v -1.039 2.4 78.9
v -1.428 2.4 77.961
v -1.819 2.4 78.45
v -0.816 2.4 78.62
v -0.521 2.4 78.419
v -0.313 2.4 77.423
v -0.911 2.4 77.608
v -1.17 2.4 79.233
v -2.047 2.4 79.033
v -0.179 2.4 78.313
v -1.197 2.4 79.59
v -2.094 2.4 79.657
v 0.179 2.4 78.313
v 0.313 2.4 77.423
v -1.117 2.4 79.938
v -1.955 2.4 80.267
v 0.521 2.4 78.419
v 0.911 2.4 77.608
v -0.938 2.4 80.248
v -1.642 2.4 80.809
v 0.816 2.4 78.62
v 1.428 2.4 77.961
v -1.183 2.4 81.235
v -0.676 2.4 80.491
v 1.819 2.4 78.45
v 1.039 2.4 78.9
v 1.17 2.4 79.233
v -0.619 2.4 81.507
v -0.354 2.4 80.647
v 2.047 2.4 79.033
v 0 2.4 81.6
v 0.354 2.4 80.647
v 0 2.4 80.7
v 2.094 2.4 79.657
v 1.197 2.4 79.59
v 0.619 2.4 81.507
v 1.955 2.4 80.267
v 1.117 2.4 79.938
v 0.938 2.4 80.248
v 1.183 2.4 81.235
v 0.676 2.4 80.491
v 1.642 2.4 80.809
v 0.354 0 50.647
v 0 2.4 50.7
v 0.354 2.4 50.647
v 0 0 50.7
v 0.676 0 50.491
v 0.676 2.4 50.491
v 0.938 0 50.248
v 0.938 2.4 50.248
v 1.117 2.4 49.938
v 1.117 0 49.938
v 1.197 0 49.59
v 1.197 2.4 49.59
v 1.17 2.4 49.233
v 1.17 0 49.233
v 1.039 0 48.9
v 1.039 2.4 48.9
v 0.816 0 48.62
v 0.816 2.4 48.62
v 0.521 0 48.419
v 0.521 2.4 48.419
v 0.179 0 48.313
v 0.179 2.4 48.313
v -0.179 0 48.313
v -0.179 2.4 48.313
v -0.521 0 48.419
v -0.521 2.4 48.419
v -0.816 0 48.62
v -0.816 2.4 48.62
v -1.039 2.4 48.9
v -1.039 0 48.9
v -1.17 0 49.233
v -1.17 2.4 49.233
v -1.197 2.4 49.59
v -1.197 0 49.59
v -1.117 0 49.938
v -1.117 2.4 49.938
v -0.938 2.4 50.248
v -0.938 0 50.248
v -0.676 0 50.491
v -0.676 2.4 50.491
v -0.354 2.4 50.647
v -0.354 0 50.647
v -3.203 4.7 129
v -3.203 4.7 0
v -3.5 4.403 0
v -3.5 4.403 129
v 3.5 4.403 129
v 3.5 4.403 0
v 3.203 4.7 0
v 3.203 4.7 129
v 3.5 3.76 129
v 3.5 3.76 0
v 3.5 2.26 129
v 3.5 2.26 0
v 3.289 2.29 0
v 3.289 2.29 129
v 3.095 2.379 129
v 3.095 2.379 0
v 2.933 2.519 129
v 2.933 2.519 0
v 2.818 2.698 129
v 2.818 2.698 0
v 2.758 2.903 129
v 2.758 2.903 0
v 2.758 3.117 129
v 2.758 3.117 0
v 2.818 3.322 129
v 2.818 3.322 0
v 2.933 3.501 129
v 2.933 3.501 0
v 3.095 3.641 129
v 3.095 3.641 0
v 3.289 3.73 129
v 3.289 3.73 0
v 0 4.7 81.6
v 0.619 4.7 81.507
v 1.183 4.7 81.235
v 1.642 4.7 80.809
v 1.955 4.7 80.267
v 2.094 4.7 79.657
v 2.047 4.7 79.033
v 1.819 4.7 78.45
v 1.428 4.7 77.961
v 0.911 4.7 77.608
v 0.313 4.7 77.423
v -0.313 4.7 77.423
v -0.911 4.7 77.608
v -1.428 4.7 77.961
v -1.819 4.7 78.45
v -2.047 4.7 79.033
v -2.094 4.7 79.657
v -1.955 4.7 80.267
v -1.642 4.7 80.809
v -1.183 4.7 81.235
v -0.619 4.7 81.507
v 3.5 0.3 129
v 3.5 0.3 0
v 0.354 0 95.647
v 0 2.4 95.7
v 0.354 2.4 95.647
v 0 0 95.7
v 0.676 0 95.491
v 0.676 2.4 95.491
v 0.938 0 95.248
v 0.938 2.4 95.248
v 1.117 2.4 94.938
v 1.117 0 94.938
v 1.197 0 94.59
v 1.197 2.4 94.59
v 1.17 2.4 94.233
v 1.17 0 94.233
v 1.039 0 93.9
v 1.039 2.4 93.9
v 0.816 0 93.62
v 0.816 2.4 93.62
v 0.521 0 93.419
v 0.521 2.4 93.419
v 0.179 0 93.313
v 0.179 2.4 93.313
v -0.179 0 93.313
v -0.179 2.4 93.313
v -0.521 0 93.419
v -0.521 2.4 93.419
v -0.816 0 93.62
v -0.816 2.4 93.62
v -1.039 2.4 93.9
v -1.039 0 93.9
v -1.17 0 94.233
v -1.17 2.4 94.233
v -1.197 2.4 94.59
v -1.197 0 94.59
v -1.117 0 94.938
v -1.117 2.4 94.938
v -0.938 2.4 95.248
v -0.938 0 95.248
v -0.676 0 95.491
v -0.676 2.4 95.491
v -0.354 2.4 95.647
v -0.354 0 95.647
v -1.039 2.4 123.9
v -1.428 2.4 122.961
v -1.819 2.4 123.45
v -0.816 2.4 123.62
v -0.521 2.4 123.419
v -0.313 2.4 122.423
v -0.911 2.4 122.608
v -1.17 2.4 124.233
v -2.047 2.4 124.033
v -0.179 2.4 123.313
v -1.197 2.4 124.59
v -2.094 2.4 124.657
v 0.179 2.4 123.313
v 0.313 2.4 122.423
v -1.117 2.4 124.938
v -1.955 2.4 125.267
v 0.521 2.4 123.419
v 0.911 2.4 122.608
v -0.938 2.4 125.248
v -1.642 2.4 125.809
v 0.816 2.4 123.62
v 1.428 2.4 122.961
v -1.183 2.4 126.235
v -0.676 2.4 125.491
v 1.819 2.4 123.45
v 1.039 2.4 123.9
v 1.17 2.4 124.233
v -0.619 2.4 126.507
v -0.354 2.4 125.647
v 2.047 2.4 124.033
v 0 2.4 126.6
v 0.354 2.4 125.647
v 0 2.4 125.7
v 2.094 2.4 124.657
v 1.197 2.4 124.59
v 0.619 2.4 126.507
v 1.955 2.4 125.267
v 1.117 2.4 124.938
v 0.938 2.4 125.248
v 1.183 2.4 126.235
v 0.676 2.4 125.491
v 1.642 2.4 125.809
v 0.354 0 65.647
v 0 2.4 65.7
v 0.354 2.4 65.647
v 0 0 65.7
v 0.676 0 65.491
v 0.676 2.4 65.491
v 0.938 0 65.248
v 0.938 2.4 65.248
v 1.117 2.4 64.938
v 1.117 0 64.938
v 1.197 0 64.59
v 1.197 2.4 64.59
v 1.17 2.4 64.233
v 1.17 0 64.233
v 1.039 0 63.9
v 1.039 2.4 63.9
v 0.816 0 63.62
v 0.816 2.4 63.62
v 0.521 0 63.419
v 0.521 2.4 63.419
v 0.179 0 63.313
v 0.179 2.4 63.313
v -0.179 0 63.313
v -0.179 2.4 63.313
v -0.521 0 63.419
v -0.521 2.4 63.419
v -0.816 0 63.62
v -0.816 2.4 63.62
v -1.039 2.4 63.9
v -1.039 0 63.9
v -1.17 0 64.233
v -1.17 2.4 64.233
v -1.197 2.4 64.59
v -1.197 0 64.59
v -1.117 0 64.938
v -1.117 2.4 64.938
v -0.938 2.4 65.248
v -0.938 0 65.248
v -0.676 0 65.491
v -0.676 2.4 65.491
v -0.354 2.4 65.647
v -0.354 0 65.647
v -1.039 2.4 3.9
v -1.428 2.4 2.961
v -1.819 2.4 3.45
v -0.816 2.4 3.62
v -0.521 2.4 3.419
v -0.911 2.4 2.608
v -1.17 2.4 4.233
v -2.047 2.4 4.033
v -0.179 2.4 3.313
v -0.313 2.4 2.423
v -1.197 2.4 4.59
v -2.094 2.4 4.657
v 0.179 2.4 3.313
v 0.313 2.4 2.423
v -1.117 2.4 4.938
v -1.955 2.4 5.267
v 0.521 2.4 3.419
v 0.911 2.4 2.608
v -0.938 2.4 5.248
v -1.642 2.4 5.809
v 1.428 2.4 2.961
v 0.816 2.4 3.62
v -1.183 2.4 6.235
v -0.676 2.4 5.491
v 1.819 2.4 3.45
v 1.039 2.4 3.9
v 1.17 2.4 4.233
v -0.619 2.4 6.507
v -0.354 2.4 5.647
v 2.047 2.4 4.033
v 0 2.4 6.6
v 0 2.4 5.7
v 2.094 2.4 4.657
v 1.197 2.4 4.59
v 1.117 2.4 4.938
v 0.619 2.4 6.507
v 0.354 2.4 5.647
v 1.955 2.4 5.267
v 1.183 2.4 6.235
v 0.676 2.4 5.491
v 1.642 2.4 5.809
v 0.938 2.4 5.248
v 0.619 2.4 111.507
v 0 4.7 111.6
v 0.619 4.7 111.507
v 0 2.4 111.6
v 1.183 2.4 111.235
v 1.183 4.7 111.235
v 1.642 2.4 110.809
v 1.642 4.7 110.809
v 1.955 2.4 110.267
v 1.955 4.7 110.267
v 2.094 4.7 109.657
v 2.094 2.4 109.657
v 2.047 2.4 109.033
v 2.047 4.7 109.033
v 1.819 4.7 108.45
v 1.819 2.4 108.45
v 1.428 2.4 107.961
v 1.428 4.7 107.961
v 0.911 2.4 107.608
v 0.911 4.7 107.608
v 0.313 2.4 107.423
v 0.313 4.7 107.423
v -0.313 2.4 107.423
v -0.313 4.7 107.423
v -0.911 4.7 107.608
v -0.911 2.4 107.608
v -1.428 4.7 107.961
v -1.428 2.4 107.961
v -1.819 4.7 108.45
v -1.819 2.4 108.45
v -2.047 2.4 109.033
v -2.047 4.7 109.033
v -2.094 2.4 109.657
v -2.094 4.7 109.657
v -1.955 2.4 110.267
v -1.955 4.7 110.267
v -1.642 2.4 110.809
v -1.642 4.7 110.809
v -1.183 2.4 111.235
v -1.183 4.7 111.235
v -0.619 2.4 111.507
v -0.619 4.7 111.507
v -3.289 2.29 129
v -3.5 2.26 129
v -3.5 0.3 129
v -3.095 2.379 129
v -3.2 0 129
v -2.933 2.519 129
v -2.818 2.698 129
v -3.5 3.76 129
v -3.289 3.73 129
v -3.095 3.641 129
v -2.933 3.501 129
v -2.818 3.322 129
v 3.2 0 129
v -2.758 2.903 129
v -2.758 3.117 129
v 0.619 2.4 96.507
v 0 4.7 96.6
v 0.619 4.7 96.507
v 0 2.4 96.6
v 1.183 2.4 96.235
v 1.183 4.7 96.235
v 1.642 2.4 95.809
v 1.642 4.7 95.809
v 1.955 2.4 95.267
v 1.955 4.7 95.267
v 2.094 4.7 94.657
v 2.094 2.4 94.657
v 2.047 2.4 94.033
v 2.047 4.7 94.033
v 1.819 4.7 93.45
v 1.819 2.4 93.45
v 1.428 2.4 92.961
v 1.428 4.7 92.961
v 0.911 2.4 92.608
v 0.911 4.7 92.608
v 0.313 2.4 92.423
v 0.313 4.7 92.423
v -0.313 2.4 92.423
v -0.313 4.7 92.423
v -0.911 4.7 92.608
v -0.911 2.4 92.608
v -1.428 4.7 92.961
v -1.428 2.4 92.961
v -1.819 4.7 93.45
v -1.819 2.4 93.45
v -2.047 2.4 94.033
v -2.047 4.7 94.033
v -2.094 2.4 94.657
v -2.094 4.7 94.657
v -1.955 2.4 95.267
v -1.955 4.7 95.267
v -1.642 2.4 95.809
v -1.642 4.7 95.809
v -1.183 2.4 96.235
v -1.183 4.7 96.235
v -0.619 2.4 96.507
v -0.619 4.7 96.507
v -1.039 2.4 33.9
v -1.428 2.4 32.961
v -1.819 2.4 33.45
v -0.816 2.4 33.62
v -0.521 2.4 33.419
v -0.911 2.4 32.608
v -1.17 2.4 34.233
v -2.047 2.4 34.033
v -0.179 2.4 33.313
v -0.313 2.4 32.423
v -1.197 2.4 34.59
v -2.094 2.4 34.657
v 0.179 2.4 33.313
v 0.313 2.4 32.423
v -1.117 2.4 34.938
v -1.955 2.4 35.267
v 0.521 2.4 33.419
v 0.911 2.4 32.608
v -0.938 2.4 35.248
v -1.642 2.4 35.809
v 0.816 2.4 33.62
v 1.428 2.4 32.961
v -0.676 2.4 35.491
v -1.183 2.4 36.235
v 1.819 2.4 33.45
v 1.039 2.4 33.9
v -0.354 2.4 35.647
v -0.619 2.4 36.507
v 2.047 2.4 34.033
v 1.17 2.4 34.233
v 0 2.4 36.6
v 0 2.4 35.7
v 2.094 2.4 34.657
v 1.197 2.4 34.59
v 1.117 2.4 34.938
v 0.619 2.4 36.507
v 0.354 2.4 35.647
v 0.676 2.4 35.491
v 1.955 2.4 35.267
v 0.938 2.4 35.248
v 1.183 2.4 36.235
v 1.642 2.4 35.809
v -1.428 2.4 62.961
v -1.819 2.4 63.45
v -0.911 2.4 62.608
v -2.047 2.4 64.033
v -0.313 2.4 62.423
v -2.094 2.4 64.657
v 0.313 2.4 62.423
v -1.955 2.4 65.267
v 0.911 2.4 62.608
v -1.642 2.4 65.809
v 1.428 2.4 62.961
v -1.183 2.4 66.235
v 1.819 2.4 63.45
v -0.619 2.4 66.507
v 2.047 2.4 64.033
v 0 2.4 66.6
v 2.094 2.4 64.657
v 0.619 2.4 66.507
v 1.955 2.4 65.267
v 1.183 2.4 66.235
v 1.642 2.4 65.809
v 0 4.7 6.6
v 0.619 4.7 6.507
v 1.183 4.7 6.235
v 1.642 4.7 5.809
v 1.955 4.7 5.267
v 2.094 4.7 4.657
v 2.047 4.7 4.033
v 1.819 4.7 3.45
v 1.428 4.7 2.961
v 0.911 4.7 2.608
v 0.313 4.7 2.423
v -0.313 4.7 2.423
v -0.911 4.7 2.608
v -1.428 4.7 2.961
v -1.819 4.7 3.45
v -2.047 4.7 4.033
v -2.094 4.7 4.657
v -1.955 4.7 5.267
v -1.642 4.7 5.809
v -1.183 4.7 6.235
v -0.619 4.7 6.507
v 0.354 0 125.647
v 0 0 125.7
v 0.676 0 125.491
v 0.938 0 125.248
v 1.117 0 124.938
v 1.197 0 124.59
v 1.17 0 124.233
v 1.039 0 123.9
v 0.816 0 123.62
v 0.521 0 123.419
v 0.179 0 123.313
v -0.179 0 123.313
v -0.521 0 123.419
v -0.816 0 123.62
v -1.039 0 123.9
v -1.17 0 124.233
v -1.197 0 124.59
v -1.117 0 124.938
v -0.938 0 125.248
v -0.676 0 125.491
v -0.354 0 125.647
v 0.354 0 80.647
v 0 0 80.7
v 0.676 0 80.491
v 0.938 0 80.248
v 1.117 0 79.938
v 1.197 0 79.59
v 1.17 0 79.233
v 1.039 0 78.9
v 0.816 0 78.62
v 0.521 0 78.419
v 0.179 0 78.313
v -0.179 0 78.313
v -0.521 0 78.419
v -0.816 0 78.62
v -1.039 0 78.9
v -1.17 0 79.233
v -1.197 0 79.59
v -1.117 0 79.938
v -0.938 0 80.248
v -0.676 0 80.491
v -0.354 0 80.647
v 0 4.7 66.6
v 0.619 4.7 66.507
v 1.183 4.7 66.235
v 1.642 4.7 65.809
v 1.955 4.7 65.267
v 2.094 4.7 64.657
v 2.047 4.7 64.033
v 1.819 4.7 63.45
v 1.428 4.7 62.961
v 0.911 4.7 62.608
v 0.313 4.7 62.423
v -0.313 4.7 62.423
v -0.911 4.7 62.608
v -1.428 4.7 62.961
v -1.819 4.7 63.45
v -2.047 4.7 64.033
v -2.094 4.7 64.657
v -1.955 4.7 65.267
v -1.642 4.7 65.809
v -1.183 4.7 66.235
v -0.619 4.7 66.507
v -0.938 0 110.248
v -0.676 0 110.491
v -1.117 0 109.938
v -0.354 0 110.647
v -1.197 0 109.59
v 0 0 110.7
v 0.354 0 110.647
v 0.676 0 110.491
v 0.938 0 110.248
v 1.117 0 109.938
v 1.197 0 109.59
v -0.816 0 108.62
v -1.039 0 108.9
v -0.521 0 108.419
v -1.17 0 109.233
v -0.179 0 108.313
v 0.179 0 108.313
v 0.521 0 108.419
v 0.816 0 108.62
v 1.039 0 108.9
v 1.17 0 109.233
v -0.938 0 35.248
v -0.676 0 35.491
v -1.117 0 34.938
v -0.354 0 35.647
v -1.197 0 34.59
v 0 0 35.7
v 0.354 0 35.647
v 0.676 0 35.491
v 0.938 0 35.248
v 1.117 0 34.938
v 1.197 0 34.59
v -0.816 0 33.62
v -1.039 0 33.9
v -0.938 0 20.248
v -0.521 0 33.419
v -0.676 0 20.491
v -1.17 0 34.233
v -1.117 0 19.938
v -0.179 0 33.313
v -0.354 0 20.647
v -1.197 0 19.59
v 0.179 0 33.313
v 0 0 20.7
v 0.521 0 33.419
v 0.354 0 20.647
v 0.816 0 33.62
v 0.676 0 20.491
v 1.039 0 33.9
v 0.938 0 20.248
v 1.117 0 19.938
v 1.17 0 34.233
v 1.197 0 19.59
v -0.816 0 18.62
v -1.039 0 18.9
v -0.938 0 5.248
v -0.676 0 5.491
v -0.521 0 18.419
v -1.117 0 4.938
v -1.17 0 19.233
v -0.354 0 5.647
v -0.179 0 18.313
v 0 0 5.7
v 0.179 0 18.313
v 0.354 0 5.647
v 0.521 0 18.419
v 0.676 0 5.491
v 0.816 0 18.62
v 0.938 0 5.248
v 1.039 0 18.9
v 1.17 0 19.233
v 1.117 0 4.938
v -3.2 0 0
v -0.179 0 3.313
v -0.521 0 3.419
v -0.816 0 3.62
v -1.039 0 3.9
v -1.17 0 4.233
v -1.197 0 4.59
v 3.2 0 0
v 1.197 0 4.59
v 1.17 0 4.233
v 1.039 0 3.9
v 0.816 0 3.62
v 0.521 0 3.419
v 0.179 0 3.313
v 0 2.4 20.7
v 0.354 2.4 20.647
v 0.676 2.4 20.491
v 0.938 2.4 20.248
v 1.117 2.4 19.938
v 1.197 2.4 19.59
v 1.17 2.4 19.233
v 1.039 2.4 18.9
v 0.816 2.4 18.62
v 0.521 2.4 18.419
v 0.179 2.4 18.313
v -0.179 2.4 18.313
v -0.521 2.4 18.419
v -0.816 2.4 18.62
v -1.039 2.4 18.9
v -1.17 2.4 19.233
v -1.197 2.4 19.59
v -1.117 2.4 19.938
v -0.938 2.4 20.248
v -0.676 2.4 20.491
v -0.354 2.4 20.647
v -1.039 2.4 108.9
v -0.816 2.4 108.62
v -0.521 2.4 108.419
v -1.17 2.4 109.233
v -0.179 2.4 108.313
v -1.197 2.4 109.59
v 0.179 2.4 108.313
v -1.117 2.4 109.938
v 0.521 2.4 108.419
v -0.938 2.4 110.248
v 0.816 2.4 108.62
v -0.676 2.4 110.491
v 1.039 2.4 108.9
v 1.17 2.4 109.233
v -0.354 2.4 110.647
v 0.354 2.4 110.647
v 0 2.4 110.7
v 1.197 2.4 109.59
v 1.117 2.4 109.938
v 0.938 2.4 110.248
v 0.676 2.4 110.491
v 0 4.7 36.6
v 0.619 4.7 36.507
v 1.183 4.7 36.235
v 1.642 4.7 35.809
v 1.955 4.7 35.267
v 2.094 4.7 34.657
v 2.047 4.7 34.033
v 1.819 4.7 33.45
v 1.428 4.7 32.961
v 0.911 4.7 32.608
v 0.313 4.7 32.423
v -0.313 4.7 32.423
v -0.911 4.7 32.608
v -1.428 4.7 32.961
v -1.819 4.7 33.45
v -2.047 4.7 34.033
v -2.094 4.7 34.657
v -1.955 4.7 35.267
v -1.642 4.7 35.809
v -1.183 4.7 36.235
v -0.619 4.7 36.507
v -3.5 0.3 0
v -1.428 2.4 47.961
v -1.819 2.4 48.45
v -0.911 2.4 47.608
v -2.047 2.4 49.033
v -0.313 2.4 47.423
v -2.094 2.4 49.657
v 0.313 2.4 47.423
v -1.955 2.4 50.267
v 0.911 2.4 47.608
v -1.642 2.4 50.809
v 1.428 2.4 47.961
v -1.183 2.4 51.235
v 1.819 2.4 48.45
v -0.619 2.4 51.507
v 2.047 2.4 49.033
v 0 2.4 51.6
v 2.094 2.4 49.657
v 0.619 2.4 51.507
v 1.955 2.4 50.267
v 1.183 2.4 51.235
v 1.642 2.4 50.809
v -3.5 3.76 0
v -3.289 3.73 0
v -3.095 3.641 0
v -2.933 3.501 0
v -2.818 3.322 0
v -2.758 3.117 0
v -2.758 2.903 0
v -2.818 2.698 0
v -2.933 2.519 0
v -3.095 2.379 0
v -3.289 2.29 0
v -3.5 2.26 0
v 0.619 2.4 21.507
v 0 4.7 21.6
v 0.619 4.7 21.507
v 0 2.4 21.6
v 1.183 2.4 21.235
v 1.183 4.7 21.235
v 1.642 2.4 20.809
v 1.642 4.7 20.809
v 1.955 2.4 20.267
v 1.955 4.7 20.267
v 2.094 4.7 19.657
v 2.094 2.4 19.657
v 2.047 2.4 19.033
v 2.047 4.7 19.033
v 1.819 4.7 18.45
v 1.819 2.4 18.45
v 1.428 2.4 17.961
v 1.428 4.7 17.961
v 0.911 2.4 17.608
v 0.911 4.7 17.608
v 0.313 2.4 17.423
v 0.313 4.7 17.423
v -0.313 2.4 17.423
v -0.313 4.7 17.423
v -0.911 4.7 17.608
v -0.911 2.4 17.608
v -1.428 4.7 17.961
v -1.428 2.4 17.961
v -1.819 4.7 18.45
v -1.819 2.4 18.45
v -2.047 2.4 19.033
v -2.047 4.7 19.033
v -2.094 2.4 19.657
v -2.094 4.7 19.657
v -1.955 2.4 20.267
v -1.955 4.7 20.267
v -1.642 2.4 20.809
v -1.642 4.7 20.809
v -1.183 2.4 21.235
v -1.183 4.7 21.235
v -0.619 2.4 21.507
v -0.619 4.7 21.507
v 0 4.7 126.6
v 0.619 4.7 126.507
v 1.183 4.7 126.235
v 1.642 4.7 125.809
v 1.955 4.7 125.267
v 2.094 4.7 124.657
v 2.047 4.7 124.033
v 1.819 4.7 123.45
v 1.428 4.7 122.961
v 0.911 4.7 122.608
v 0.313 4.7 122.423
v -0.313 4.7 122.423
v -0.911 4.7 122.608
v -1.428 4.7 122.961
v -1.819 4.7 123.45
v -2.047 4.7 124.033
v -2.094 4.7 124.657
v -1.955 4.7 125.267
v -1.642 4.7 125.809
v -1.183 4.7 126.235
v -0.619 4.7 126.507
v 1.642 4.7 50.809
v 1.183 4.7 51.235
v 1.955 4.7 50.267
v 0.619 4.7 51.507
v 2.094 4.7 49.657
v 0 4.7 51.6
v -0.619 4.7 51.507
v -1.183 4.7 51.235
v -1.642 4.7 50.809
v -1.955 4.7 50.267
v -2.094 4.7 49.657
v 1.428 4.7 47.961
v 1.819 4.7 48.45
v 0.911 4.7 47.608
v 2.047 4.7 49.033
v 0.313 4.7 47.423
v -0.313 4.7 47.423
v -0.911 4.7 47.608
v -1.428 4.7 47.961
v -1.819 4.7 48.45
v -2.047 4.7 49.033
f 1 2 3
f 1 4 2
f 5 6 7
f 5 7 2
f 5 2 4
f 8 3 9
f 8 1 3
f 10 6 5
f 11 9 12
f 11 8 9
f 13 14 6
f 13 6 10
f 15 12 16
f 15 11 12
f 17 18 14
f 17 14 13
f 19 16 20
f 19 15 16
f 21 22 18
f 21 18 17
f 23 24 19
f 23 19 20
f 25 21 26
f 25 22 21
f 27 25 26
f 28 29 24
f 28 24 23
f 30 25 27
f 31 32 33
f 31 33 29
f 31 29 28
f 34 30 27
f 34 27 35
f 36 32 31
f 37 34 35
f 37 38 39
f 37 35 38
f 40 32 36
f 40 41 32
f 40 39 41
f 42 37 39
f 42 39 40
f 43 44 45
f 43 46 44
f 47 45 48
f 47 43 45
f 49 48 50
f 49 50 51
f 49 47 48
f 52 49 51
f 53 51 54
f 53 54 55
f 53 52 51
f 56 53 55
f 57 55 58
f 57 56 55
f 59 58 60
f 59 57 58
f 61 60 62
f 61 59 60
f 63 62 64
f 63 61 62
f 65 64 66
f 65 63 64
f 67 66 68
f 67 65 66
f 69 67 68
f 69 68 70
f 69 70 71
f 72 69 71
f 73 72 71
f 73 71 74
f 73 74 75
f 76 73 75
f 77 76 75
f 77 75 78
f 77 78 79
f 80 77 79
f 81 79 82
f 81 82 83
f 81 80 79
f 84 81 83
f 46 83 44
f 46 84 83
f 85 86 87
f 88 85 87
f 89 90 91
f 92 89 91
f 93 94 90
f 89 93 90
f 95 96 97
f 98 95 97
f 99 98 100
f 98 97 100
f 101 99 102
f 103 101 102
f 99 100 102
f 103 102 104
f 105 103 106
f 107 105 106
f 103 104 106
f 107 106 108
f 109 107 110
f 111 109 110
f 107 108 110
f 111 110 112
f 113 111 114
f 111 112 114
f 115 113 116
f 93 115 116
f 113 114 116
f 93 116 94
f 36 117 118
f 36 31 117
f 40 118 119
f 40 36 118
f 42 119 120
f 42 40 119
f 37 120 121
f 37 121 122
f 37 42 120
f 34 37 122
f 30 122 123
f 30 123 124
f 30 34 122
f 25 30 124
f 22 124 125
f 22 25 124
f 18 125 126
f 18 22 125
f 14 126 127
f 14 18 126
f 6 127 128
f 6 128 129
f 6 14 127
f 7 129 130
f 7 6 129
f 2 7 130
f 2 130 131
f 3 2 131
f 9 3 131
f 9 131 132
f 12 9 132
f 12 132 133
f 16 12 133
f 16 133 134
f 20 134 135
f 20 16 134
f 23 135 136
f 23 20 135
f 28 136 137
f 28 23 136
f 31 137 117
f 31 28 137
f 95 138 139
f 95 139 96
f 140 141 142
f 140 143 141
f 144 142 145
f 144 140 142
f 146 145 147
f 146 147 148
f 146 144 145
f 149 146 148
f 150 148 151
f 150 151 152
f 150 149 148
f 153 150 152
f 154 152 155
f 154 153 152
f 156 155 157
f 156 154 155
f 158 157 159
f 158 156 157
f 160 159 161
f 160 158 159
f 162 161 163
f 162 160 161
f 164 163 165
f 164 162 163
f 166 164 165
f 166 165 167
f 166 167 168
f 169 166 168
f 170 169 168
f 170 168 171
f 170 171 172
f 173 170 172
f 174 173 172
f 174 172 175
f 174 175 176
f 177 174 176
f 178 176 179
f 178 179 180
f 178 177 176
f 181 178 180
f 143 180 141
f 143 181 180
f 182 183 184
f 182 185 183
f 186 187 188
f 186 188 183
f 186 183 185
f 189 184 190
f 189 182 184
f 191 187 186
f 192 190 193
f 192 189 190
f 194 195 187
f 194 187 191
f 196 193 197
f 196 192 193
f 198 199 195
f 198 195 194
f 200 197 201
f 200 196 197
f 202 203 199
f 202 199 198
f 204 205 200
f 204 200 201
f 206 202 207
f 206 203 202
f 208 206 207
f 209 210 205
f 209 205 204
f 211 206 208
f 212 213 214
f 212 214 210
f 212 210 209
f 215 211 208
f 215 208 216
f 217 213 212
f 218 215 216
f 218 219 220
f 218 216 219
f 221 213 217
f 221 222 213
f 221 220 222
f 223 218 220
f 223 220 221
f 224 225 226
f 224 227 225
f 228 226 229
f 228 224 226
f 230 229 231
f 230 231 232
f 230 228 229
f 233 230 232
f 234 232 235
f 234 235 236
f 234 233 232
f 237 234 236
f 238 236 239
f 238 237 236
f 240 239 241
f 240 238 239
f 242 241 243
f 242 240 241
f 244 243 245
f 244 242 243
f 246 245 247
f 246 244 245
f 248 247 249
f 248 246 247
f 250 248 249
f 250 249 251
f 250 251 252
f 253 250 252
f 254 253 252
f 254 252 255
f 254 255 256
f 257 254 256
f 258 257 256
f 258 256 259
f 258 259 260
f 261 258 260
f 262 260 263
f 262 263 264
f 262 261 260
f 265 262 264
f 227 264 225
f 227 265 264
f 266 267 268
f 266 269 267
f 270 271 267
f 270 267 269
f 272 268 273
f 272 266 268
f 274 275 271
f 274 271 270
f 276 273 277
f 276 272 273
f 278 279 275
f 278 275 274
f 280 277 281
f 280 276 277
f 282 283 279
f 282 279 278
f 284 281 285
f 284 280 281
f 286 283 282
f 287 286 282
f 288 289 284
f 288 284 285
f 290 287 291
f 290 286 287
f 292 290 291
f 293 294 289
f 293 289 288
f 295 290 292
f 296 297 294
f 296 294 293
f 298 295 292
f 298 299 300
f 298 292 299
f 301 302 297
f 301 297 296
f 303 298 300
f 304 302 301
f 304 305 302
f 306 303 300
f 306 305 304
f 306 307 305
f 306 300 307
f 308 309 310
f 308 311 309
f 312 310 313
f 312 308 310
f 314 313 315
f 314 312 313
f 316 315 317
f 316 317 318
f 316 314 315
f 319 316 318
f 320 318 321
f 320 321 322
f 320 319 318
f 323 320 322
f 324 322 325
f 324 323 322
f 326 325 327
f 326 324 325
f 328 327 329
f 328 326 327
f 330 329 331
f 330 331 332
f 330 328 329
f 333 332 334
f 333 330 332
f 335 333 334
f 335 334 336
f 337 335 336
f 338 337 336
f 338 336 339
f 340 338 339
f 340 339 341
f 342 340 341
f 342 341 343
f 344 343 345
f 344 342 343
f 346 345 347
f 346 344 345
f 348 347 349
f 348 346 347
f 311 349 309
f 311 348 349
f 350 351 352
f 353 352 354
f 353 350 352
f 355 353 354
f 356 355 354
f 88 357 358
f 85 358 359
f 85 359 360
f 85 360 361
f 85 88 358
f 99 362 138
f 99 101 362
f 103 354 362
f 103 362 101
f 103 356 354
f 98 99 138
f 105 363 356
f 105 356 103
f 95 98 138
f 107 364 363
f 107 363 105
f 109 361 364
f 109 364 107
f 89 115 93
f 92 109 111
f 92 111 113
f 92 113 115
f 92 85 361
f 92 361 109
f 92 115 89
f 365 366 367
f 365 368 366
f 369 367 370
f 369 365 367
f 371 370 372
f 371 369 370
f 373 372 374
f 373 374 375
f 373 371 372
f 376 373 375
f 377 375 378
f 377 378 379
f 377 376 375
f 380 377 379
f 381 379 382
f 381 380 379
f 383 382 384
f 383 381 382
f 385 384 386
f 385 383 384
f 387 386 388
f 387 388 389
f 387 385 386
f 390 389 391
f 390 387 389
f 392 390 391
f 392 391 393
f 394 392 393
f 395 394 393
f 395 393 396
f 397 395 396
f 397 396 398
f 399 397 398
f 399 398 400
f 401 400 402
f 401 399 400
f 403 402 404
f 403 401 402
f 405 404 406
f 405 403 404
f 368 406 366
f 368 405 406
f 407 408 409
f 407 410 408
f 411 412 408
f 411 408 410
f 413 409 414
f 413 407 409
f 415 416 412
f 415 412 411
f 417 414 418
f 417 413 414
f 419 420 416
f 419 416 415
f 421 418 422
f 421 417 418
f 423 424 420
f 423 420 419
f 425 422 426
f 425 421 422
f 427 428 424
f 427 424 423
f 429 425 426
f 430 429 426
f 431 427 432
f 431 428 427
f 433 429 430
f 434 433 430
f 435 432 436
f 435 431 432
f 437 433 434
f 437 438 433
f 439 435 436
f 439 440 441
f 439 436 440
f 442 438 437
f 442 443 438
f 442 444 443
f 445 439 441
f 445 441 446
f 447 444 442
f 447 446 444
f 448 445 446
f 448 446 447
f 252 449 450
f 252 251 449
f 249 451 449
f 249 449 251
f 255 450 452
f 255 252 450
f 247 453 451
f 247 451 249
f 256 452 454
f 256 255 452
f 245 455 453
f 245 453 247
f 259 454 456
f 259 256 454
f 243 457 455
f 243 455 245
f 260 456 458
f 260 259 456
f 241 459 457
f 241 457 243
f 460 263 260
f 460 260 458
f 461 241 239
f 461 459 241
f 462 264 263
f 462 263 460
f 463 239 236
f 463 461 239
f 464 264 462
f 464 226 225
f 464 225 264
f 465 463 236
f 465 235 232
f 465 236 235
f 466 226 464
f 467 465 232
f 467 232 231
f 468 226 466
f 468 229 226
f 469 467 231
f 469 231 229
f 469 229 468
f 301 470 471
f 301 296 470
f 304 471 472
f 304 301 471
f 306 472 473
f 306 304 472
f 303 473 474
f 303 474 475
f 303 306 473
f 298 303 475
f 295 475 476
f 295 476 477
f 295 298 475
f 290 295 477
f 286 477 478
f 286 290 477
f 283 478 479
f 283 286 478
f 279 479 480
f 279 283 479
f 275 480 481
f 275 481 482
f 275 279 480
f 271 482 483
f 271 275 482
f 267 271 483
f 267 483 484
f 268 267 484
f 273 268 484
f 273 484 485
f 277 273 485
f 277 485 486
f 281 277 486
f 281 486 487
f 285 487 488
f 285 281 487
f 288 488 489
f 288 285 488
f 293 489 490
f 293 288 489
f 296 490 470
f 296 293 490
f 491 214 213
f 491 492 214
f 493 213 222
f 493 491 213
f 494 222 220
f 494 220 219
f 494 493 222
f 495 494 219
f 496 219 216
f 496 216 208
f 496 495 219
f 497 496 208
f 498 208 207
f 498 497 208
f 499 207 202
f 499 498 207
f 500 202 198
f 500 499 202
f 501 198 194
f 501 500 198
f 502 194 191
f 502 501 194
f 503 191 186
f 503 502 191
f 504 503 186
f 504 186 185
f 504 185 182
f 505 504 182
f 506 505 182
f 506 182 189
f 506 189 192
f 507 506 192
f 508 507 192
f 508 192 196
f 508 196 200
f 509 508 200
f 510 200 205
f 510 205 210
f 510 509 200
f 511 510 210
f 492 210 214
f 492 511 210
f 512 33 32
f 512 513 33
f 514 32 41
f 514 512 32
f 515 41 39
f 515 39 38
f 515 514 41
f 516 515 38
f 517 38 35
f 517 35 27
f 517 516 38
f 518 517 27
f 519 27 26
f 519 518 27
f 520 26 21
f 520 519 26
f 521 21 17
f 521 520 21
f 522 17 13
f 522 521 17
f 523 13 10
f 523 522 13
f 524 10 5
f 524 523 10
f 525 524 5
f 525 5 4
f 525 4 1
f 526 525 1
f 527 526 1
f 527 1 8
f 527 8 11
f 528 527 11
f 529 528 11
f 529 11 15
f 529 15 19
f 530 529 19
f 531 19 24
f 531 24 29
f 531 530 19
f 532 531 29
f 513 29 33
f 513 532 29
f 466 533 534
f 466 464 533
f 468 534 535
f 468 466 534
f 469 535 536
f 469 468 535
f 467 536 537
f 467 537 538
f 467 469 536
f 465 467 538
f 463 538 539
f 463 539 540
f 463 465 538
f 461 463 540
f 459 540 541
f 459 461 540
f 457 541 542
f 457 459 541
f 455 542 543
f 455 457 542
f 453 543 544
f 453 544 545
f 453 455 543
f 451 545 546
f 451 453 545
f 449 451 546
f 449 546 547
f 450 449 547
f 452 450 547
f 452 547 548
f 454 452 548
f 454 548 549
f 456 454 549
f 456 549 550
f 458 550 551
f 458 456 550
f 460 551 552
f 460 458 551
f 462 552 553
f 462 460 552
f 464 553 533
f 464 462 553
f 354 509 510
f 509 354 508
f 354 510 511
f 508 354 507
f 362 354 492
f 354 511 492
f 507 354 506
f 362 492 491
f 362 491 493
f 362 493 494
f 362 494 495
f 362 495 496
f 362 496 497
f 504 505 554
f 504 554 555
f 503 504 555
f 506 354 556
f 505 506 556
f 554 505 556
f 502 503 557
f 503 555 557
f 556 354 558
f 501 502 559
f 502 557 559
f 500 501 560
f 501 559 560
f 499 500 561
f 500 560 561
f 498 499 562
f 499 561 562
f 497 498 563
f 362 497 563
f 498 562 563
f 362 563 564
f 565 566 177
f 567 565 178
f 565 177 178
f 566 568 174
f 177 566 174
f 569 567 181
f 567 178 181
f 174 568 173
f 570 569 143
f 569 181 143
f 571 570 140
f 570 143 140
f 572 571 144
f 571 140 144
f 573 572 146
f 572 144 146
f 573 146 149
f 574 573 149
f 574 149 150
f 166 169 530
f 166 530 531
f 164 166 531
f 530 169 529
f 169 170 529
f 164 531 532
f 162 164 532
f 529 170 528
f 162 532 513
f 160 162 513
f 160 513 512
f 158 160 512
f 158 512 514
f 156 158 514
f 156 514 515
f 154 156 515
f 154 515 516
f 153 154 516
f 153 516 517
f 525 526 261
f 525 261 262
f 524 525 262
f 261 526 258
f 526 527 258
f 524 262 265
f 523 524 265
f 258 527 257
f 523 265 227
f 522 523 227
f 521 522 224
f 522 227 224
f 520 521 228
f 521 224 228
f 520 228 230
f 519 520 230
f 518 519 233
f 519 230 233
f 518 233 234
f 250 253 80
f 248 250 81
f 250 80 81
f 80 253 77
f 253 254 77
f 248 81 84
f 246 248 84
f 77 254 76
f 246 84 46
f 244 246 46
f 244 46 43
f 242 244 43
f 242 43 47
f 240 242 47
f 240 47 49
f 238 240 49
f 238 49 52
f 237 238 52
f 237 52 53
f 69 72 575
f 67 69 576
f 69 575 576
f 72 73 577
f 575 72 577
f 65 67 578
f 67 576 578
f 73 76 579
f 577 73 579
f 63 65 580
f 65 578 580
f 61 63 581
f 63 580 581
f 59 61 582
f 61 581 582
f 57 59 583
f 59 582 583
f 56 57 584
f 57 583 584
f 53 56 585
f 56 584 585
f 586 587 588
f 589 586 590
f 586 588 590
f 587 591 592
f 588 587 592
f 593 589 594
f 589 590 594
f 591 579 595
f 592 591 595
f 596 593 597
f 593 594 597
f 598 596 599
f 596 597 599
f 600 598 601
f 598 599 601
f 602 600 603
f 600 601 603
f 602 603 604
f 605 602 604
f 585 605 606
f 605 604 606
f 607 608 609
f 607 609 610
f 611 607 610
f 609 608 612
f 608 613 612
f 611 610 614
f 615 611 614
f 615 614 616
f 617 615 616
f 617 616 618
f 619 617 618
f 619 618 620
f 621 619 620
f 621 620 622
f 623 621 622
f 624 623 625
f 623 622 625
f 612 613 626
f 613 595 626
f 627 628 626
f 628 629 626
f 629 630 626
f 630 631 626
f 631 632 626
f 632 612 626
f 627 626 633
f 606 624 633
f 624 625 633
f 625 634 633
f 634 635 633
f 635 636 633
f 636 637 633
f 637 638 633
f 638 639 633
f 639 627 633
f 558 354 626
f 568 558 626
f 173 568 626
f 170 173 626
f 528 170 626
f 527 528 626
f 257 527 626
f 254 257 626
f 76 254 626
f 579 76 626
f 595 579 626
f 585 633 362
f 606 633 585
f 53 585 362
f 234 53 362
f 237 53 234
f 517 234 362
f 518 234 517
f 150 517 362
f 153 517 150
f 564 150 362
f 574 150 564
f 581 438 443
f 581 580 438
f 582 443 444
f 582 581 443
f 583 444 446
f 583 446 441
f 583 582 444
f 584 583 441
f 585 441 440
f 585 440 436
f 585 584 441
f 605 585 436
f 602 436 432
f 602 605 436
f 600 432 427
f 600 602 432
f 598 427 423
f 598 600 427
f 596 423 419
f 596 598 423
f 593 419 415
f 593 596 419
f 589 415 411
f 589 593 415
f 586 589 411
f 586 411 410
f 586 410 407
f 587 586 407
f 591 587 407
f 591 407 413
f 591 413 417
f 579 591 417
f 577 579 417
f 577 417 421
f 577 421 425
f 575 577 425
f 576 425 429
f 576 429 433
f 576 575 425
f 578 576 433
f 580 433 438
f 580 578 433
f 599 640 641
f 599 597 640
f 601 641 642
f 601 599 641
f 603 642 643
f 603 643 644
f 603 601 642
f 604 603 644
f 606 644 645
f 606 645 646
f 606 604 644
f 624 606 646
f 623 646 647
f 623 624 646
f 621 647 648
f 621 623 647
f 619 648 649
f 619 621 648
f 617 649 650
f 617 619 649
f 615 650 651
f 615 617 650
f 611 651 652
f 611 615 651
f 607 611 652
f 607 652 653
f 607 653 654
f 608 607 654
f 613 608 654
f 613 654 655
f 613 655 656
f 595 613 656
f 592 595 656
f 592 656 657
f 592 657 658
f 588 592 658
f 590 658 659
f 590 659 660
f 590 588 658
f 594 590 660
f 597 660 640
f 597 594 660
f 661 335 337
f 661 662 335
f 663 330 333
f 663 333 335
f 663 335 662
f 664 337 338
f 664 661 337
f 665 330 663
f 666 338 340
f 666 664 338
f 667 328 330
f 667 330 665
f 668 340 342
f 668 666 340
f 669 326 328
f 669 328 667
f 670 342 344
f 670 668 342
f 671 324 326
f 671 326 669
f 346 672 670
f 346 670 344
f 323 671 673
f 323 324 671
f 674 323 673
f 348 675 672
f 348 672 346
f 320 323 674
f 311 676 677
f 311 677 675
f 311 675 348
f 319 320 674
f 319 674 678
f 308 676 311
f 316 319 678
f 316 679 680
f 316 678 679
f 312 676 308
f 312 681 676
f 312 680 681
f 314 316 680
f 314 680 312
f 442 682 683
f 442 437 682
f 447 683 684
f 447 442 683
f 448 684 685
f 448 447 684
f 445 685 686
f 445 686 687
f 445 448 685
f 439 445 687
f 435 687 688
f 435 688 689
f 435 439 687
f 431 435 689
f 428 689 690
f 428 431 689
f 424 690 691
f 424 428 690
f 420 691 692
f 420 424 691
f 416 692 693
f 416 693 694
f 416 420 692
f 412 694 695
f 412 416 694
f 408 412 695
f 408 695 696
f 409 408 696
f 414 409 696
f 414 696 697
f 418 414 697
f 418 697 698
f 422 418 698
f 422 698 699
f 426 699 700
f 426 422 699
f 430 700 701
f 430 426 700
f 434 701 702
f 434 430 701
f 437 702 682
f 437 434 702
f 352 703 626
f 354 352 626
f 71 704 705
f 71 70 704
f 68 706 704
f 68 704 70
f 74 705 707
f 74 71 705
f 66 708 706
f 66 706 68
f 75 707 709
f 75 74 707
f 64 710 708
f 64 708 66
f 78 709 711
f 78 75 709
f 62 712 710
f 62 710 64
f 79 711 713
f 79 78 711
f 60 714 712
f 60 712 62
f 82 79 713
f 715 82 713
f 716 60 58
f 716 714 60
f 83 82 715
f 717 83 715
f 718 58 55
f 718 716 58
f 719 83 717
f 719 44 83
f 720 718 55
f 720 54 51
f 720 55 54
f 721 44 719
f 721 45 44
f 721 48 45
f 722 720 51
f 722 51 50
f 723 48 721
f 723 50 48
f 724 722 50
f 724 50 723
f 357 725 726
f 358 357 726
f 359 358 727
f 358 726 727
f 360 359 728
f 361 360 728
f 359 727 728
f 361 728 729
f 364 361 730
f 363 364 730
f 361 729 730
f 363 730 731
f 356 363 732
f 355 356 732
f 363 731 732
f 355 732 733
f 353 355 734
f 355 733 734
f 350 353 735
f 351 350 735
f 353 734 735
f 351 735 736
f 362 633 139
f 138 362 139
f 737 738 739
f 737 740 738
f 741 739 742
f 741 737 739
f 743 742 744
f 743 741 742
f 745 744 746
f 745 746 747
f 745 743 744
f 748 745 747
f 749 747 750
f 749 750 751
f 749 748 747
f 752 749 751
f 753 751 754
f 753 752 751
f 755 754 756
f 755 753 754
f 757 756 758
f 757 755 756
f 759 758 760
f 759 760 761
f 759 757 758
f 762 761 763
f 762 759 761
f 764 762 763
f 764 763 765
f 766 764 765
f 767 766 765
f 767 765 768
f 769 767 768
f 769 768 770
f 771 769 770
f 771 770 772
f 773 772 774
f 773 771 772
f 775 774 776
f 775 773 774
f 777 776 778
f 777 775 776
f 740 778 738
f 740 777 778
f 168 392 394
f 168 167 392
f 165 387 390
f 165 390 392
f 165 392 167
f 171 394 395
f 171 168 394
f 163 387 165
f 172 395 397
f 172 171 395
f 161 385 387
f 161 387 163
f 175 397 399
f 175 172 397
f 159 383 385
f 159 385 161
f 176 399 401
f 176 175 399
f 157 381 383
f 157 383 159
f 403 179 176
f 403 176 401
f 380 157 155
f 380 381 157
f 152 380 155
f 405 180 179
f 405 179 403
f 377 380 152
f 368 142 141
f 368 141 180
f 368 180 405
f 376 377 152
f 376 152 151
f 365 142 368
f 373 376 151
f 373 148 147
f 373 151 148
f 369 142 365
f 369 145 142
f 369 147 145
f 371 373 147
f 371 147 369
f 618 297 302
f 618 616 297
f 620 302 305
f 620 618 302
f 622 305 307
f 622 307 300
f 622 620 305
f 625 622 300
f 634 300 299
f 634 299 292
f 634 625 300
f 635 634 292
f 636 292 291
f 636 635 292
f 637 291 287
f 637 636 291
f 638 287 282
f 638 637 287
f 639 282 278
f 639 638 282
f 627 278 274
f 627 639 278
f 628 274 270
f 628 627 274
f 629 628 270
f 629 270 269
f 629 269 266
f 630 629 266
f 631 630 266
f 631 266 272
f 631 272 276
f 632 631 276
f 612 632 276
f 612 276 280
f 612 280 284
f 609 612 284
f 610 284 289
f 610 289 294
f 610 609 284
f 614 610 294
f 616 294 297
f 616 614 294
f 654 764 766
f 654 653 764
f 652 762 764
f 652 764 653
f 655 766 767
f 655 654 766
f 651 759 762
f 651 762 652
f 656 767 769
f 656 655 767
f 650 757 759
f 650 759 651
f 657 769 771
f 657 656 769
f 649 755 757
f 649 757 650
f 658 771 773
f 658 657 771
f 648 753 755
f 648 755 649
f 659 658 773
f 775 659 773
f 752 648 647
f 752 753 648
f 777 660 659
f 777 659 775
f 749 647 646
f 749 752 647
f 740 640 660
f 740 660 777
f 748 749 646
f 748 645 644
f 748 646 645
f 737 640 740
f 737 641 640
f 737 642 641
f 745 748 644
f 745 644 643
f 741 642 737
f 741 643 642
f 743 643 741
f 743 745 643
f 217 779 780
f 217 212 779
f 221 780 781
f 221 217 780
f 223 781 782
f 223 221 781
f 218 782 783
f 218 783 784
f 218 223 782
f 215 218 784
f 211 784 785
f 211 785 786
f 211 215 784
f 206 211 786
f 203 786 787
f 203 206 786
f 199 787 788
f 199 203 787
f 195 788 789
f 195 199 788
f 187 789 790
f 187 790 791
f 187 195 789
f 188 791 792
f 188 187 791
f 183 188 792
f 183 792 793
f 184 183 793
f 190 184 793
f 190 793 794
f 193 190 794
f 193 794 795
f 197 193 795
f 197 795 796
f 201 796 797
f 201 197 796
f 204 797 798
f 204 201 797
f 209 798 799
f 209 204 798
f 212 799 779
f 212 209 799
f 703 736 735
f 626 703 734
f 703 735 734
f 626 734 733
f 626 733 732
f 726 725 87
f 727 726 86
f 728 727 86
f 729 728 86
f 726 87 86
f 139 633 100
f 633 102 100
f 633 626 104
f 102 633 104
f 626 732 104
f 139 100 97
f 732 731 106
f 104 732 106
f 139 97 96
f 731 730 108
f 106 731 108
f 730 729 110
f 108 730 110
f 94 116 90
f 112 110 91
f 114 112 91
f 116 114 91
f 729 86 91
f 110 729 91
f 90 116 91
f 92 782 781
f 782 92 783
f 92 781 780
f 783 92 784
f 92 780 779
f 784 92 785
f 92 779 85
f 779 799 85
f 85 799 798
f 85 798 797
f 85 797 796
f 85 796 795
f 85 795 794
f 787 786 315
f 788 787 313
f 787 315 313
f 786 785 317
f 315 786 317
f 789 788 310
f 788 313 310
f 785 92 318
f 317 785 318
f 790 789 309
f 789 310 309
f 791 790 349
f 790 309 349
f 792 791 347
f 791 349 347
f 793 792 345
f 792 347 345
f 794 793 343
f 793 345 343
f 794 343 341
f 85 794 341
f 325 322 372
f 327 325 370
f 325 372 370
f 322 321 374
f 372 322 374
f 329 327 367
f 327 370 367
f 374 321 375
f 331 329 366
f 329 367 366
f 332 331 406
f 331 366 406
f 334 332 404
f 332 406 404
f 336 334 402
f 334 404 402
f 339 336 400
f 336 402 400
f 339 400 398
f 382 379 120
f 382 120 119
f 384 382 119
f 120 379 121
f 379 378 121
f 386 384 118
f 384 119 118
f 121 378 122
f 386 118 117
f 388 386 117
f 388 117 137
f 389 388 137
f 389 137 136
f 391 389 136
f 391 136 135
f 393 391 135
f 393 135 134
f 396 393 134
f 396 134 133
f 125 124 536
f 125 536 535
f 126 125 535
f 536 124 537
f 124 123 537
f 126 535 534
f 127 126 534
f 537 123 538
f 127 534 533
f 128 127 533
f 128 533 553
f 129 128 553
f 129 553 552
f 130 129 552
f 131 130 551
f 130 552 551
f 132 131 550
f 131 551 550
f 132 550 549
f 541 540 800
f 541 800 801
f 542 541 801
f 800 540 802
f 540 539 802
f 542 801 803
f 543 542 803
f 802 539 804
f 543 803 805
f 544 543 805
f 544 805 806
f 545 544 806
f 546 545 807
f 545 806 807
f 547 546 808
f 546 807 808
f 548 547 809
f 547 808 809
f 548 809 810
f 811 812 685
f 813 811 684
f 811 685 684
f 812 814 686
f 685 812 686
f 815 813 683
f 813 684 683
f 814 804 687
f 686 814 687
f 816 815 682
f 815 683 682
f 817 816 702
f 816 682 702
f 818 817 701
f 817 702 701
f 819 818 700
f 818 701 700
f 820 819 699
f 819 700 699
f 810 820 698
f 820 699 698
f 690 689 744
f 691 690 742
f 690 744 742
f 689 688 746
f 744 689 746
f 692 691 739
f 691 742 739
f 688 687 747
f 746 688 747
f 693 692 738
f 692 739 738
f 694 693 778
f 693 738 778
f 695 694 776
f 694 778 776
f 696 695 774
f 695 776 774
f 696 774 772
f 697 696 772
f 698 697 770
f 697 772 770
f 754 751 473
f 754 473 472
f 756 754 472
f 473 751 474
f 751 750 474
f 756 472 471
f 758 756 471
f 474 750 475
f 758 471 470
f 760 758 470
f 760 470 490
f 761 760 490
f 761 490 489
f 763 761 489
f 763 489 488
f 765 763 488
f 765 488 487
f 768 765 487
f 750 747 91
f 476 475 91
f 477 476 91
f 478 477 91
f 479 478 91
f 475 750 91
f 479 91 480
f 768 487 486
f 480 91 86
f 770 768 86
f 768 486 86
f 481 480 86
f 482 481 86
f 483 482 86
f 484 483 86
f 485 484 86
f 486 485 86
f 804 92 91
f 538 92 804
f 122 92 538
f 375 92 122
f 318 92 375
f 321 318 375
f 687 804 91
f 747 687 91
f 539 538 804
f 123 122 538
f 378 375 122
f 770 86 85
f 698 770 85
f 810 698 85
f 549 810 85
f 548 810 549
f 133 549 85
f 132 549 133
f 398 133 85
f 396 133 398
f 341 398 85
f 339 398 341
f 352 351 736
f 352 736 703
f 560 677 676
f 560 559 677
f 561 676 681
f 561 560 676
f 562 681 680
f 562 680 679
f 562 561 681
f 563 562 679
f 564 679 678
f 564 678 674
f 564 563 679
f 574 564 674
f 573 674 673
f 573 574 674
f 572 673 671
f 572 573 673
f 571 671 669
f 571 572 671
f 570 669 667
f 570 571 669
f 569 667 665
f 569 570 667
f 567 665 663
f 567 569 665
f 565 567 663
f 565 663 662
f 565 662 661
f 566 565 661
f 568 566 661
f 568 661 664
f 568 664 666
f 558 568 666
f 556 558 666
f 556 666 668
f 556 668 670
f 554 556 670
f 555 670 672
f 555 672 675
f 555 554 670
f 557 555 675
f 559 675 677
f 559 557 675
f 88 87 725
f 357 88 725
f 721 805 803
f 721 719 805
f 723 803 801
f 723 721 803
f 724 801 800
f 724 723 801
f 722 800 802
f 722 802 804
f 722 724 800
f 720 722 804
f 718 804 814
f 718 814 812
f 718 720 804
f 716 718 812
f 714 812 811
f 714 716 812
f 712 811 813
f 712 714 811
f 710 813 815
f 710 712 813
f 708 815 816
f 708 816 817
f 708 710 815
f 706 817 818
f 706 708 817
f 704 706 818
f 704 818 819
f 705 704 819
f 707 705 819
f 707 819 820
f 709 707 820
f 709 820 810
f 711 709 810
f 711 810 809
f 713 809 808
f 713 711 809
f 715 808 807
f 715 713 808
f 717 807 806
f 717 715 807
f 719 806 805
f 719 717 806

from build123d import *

# Parameters (mm, degrees)
BOSS_EXTRUDE1_DEPTH = 129


with BuildPart() as part:
    # Sketch1 → Boss-Extrude1 (new body)
    with BuildSketch(Plane.XY):
        with BuildLine():
            Line((-3.5, 4.403015152), (-3.5, 3.76))
            ThreePointArc((-3.5, 3.76), (-2.75, 3.01), (-3.5, 2.26))
            Line((-3.5, 2.26), (-3.5, 0.3))
            Line((-3.5, 0.3), (-3.2, 0))
            Line((-3.2, 0), (3.2, 0))
            Line((3.2, 0), (3.5, 0.3))
            Line((3.5, 0.3), (3.5, 2.26))
            ThreePointArc((3.5, 2.26), (2.75, 3.01), (3.5, 3.76))
            Line((3.5, 3.76), (3.5, 4.403015152))
            Line((3.5, 4.403015152), (3.203015152, 4.7))
            Line((3.203015152, 4.7), (-3.203015152, 4.7))
            Line((-3.203015152, 4.7), (-3.5, 4.403015152))
        make_face()
    extrude(amount=BOSS_EXTRUDE1_DEPTH)

    # Sketch2 → Cut-Revolve1 (revolve, cut)
    with BuildSketch(Plane(origin=(0, 0, 0), x_dir=(0, 0, -1), z_dir=(1, 0, 0)), mode=Mode.PRIVATE) as cut_revolve1_sk:
        Polygon((-4.5, 4.7), (-2.4, 4.7), (-2.4, 2.4), (-3.3, 2.4), (-3.3, 0), (-4.5, 0), align=None)
    revolve(cut_revolve1_sk.sketch.rotate(Axis((0, 0, 4.5), (0, 1, 0)), 180), axis=Axis((0, 0, 4.5), (0, 1, 0)), mode=Mode.SUBTRACT)

    # Sketch3 → Cut-Revolve2 (revolve, cut)
    with BuildSketch(Plane(origin=(0, 0, 0), x_dir=(0, 0, -1), z_dir=(1, 0, 0)), mode=Mode.PRIVATE) as cut_revolve2_sk:
        Polygon((-124.5, 4.7), (-122.4, 4.7), (-122.4, 2.4), (-123.3, 2.4), (-123.3, 0), (-124.5, 0), align=None)
    revolve(cut_revolve2_sk.sketch.rotate(Axis((0, 0, 124.5), (0, 1, 0)), 180), axis=Axis((0, 0, 124.5), (0, 1, 0)), mode=Mode.SUBTRACT)

    # Sketch4 → Cut-Revolve3 (revolve, cut)
    with BuildSketch(Plane(origin=(0, 0, 0), x_dir=(0, 0, -1), z_dir=(1, 0, 0)), mode=Mode.PRIVATE) as cut_revolve3_sk:
        Polygon((-109.5, 4.7), (-107.4, 4.7), (-107.4, 2.4), (-108.3, 2.4), (-108.3, 0), (-109.5, 0), align=None)
    revolve(cut_revolve3_sk.sketch.rotate(Axis((0, 0, 109.5), (0, 1, 0)), 180), axis=Axis((0, 0, 109.5), (0, 1, 0)), mode=Mode.SUBTRACT)

    # Sketch5 → Cut-Revolve4 (revolve, cut)
    with BuildSketch(Plane(origin=(0, 0, 0), x_dir=(0, 0, -1), z_dir=(1, 0, 0)), mode=Mode.PRIVATE) as cut_revolve4_sk:
        Polygon((-94.5, 4.7), (-92.4, 4.7), (-92.4, 2.4), (-93.3, 2.4), (-93.3, 0), (-94.5, 0), align=None)
    revolve(cut_revolve4_sk.sketch.rotate(Axis((0, 0, 94.5), (0, 1, 0)), 180), axis=Axis((0, 0, 94.5), (0, 1, 0)), mode=Mode.SUBTRACT)

    # Sketch6 → Cut-Revolve5 (revolve, cut)
    with BuildSketch(Plane(origin=(0, 0, 0), x_dir=(0, 0, -1), z_dir=(1, 0, 0)), mode=Mode.PRIVATE) as cut_revolve5_sk:
        Polygon((-79.5, 4.7), (-77.4, 4.7), (-77.4, 2.4), (-78.3, 2.4), (-78.3, 0), (-79.5, 0), align=None)
    revolve(cut_revolve5_sk.sketch.rotate(Axis((0, 0, 79.5), (0, 1, 0)), 180), axis=Axis((0, 0, 79.5), (0, 1, 0)), mode=Mode.SUBTRACT)

    # Sketch7 → Cut-Revolve6 (revolve, cut)
    with BuildSketch(Plane(origin=(0, 0, 0), x_dir=(0, 0, -1), z_dir=(1, 0, 0)), mode=Mode.PRIVATE) as cut_revolve6_sk:
        Polygon((-64.5, 4.7), (-62.4, 4.7), (-62.4, 2.4), (-63.3, 2.4), (-63.3, 0), (-64.5, 0), align=None)
    revolve(cut_revolve6_sk.sketch.rotate(Axis((0, 0, 64.5), (0, 1, 0)), 180), axis=Axis((0, 0, 64.5), (0, 1, 0)), mode=Mode.SUBTRACT)

    # Sketch8 → Cut-Revolve7 (revolve, cut)
    with BuildSketch(Plane(origin=(0, 0, 0), x_dir=(0, 0, -1), z_dir=(1, 0, 0)), mode=Mode.PRIVATE) as cut_revolve7_sk:
        Polygon((-49.5, 4.7), (-47.4, 4.7), (-47.4, 2.4), (-48.3, 2.4), (-48.3, 0), (-49.5, 0), align=None)
    revolve(cut_revolve7_sk.sketch.rotate(Axis((0, 0, 49.5), (0, 1, 0)), 180), axis=Axis((0, 0, 49.5), (0, 1, 0)), mode=Mode.SUBTRACT)

    # Sketch9 → Cut-Revolve8 (revolve, cut)
    with BuildSketch(Plane(origin=(0, 0, 0), x_dir=(0, 0, -1), z_dir=(1, 0, 0)), mode=Mode.PRIVATE) as cut_revolve8_sk:
        Polygon((-34.5, 4.7), (-32.4, 4.7), (-32.4, 2.4), (-33.3, 2.4), (-33.3, 0), (-34.5, 0), align=None)
    revolve(cut_revolve8_sk.sketch.rotate(Axis((0, 0, 34.5), (0, 1, 0)), 180), axis=Axis((0, 0, 34.5), (0, 1, 0)), mode=Mode.SUBTRACT)

    # Sketch10 → Cut-Revolve9 (revolve, cut)
    with BuildSketch(Plane(origin=(0, 0, 0), x_dir=(0, 0, -1), z_dir=(1, 0, 0)), mode=Mode.PRIVATE) as cut_revolve9_sk:
        Polygon((-19.5, 4.7), (-17.4, 4.7), (-17.4, 2.4), (-18.3, 2.4), (-18.3, 0), (-19.5, 0), align=None)
    revolve(cut_revolve9_sk.sketch.rotate(Axis((0, 0, 19.5), (0, 1, 0)), 180), axis=Axis((0, 0, 19.5), (0, 1, 0)), mode=Mode.SUBTRACT)


solid = part.part
